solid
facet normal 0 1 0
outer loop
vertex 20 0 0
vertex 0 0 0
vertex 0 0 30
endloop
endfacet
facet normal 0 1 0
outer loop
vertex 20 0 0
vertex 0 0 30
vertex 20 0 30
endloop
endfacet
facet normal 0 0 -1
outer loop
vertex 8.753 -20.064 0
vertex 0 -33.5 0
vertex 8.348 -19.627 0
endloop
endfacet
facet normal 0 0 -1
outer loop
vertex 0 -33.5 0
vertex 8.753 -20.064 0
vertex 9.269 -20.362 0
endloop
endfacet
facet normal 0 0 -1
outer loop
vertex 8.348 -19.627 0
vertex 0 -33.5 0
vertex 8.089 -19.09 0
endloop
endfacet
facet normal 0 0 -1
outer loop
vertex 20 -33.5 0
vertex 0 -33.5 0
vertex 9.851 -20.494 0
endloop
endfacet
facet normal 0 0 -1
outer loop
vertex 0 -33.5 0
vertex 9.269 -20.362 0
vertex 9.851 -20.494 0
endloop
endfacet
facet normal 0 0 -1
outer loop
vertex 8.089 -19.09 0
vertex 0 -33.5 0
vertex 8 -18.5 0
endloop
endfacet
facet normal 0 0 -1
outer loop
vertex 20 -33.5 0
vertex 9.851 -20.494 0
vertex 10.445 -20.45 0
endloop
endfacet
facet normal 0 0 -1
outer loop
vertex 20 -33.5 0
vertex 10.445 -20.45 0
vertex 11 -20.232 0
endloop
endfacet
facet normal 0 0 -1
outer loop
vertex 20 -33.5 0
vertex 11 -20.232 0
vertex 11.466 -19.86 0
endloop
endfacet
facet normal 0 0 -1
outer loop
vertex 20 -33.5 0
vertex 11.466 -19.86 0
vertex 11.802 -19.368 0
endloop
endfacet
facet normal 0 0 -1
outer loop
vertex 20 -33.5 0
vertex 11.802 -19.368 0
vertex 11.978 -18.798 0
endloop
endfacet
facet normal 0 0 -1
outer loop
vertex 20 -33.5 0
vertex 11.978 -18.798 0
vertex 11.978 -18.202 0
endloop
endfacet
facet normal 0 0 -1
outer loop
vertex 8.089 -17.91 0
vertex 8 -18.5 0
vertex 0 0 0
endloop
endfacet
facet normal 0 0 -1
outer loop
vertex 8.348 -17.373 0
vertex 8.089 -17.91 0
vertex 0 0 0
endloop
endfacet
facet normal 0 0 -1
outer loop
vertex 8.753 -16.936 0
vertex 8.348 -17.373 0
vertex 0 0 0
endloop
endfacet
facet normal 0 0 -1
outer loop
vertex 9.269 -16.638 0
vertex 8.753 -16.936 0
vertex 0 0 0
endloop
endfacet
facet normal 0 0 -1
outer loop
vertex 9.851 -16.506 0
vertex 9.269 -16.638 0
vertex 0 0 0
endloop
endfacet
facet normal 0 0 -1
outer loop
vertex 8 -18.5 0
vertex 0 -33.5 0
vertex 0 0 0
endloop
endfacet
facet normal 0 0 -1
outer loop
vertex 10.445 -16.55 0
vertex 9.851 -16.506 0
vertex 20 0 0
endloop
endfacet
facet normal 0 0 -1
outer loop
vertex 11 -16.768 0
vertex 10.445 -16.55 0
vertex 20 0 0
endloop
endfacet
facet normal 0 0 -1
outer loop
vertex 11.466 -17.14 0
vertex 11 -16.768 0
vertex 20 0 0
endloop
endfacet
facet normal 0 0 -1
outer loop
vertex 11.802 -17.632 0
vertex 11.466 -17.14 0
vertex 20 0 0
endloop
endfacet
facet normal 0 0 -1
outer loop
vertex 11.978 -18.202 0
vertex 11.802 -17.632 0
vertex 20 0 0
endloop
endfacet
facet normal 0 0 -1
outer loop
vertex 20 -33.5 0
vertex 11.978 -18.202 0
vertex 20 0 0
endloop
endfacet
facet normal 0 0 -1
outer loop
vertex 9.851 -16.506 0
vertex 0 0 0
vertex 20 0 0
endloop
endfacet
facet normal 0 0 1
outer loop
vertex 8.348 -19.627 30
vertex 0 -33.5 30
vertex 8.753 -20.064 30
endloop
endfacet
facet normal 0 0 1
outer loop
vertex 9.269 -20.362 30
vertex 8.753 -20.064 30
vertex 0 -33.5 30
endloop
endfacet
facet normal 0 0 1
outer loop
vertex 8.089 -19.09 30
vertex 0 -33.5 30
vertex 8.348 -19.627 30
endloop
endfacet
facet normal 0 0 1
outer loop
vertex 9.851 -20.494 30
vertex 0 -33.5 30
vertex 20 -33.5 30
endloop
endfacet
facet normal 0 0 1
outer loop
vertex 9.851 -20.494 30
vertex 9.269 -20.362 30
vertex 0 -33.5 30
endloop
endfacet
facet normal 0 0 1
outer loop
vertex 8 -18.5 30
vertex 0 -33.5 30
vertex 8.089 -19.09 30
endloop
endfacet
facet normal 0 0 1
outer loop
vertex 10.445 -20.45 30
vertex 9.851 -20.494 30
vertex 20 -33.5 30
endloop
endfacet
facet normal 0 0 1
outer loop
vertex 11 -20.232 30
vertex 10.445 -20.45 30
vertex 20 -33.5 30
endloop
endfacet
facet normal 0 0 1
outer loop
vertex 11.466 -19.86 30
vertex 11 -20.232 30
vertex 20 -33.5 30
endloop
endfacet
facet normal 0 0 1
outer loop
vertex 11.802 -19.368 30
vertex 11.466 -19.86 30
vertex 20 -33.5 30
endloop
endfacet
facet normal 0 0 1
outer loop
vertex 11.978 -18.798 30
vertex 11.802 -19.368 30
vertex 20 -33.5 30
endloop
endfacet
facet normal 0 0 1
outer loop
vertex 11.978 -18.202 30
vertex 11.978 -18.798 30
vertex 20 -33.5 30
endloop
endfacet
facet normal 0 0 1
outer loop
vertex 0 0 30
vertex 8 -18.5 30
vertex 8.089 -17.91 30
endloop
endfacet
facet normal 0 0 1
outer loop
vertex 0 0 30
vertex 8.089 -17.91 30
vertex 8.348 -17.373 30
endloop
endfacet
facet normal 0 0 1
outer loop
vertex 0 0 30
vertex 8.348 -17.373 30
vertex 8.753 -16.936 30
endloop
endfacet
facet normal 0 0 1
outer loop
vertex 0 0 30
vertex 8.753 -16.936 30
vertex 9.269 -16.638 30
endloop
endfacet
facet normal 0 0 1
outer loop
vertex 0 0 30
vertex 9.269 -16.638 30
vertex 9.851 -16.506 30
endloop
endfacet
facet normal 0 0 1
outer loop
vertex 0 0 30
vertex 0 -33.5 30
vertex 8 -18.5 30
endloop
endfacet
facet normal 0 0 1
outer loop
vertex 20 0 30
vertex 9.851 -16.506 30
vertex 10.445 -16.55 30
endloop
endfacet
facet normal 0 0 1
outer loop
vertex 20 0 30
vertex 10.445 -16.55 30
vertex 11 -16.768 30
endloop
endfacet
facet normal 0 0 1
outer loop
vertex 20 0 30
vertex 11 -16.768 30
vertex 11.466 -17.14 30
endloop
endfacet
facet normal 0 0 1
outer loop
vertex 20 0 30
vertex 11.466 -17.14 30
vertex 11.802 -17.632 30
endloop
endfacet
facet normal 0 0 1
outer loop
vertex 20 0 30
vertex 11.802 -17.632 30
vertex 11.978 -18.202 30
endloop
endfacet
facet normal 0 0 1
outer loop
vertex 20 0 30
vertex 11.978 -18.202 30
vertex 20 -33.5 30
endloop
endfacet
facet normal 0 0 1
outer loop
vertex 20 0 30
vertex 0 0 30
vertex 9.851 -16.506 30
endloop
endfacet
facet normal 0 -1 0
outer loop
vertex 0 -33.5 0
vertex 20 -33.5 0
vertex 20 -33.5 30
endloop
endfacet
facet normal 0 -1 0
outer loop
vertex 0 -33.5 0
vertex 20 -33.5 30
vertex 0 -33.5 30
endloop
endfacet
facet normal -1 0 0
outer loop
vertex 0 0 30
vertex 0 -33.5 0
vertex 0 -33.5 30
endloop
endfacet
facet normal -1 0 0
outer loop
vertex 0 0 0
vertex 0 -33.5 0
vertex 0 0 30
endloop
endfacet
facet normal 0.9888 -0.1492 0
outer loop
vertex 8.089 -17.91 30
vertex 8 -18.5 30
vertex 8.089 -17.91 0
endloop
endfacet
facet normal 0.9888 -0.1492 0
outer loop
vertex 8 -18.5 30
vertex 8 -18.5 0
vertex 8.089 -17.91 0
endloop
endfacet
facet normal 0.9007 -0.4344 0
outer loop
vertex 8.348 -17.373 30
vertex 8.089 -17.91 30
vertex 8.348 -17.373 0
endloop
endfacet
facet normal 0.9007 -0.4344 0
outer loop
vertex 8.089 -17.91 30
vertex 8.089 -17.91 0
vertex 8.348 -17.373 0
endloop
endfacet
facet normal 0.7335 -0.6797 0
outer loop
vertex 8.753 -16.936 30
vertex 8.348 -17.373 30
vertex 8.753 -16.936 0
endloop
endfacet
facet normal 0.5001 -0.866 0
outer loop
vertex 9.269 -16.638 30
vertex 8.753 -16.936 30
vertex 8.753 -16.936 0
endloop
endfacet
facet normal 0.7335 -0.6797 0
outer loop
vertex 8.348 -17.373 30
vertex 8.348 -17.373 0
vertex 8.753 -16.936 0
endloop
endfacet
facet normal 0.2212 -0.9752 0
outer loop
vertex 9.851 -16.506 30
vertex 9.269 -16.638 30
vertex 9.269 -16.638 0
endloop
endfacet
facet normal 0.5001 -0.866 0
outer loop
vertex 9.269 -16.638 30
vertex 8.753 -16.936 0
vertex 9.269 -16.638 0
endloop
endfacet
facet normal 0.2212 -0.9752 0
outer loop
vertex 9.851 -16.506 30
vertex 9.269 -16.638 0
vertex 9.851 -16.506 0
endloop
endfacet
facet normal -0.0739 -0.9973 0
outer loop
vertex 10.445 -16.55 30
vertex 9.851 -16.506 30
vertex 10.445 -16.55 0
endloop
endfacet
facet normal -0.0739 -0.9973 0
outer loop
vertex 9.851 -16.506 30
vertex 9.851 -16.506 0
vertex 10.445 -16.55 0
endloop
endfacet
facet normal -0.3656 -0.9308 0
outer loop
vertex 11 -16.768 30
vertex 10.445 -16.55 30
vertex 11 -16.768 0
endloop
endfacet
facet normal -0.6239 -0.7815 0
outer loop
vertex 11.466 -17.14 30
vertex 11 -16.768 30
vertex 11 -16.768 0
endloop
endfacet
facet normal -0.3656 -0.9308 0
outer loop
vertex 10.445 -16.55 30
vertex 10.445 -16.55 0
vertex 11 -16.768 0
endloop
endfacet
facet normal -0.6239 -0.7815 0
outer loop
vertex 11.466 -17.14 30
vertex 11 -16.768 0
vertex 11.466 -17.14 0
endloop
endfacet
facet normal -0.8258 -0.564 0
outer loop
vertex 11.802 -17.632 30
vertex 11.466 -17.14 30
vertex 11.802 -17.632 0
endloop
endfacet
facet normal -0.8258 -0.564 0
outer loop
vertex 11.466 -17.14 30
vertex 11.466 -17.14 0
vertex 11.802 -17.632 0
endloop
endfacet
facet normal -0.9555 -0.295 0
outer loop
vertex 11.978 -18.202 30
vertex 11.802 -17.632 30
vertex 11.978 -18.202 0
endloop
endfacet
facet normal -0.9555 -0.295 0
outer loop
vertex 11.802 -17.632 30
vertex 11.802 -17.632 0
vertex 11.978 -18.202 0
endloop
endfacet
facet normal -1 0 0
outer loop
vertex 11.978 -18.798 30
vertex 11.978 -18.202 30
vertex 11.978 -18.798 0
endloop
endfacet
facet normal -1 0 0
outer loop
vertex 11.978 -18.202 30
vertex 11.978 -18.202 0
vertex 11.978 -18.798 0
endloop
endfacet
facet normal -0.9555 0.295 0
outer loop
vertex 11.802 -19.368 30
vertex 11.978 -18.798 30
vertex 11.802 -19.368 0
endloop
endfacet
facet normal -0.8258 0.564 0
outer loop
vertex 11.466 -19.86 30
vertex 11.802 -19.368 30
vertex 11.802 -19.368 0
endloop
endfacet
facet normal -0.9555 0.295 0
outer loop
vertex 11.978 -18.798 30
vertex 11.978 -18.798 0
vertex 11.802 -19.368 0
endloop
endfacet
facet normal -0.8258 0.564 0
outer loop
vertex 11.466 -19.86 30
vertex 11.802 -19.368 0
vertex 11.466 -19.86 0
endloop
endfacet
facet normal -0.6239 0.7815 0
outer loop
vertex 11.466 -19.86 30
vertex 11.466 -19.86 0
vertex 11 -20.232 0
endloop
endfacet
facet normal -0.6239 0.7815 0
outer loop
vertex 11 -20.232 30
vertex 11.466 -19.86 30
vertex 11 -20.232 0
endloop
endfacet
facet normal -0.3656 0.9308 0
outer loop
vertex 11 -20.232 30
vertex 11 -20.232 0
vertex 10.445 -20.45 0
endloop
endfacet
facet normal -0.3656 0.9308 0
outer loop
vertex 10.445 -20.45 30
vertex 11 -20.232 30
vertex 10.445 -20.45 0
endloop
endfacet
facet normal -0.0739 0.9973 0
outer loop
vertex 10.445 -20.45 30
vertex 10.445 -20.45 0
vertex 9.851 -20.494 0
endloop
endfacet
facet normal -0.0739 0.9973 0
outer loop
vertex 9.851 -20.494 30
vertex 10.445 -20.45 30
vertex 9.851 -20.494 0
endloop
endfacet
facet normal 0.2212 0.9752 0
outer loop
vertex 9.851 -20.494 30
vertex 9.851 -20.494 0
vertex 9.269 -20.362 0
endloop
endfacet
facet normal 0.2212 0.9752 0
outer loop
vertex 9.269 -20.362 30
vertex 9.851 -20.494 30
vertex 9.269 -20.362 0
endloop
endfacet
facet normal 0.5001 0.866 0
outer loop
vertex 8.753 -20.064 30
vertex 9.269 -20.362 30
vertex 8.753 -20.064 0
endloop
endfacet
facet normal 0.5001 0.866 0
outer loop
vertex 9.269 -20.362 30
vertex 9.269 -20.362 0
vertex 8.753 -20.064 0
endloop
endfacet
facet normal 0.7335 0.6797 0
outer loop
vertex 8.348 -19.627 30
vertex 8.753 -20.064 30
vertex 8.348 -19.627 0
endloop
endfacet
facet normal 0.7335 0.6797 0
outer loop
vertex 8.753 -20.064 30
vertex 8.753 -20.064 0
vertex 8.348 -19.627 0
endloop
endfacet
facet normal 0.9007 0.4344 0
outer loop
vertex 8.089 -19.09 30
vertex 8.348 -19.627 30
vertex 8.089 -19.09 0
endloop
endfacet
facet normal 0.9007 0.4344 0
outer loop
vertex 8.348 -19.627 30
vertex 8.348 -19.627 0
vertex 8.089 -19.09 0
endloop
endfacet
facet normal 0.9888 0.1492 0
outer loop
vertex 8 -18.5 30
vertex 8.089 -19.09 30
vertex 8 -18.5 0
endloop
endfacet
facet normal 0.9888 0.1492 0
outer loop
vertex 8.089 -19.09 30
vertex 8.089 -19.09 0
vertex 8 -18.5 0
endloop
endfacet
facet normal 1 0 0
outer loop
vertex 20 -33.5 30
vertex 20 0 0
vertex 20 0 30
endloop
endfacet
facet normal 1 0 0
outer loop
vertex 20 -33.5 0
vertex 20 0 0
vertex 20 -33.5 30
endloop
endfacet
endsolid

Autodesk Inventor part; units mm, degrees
ref_plane "YZ Plane" through (0, 0, 0) normal (1, 0, 0) x (0, 1, 0)
ref_plane "XZ Plane" through (0, 0, 0) normal (0, 1, 0) x (-1, 0, 0)
ref_plane "XY Plane" through (0, 0, 0) normal (0, 0, 1) x (1, 0, 0)
sketch "스케치1" plane through (0, 0, 0) normal (0, 0, 1) x (1, 0, 0)
  line L0 (0, 0) -> (20, 0)
  line L1 (20, 0) -> (20, -33.5)
  line L2 (20, -33.5) -> (0, -33.5)
  line L3 (0, -33.5) -> (0, 0)
  dimension "d0" = 33.5
  dimension "d1" = 20
extrude "돌출1" add sketch "스케치1" along normal blind 30
sketch "스케치2" plane through (0, 0, 0) normal (0, 0, -1) x (-1, 0, 0)
  circle A0 centre (-10, -18.5) radius 2
  line L0 (0, 0) -> (0, -33.5) projected
  line L1 (-20, 0) -> (0, 0) projected
  dimension "d4" = 4
  dimension "d5" = 10
  dimension "d6" = 18.5
extrude "돌출2" cut sketch "스케치2" against normal blind 100
properties part number "linear_actuator"
